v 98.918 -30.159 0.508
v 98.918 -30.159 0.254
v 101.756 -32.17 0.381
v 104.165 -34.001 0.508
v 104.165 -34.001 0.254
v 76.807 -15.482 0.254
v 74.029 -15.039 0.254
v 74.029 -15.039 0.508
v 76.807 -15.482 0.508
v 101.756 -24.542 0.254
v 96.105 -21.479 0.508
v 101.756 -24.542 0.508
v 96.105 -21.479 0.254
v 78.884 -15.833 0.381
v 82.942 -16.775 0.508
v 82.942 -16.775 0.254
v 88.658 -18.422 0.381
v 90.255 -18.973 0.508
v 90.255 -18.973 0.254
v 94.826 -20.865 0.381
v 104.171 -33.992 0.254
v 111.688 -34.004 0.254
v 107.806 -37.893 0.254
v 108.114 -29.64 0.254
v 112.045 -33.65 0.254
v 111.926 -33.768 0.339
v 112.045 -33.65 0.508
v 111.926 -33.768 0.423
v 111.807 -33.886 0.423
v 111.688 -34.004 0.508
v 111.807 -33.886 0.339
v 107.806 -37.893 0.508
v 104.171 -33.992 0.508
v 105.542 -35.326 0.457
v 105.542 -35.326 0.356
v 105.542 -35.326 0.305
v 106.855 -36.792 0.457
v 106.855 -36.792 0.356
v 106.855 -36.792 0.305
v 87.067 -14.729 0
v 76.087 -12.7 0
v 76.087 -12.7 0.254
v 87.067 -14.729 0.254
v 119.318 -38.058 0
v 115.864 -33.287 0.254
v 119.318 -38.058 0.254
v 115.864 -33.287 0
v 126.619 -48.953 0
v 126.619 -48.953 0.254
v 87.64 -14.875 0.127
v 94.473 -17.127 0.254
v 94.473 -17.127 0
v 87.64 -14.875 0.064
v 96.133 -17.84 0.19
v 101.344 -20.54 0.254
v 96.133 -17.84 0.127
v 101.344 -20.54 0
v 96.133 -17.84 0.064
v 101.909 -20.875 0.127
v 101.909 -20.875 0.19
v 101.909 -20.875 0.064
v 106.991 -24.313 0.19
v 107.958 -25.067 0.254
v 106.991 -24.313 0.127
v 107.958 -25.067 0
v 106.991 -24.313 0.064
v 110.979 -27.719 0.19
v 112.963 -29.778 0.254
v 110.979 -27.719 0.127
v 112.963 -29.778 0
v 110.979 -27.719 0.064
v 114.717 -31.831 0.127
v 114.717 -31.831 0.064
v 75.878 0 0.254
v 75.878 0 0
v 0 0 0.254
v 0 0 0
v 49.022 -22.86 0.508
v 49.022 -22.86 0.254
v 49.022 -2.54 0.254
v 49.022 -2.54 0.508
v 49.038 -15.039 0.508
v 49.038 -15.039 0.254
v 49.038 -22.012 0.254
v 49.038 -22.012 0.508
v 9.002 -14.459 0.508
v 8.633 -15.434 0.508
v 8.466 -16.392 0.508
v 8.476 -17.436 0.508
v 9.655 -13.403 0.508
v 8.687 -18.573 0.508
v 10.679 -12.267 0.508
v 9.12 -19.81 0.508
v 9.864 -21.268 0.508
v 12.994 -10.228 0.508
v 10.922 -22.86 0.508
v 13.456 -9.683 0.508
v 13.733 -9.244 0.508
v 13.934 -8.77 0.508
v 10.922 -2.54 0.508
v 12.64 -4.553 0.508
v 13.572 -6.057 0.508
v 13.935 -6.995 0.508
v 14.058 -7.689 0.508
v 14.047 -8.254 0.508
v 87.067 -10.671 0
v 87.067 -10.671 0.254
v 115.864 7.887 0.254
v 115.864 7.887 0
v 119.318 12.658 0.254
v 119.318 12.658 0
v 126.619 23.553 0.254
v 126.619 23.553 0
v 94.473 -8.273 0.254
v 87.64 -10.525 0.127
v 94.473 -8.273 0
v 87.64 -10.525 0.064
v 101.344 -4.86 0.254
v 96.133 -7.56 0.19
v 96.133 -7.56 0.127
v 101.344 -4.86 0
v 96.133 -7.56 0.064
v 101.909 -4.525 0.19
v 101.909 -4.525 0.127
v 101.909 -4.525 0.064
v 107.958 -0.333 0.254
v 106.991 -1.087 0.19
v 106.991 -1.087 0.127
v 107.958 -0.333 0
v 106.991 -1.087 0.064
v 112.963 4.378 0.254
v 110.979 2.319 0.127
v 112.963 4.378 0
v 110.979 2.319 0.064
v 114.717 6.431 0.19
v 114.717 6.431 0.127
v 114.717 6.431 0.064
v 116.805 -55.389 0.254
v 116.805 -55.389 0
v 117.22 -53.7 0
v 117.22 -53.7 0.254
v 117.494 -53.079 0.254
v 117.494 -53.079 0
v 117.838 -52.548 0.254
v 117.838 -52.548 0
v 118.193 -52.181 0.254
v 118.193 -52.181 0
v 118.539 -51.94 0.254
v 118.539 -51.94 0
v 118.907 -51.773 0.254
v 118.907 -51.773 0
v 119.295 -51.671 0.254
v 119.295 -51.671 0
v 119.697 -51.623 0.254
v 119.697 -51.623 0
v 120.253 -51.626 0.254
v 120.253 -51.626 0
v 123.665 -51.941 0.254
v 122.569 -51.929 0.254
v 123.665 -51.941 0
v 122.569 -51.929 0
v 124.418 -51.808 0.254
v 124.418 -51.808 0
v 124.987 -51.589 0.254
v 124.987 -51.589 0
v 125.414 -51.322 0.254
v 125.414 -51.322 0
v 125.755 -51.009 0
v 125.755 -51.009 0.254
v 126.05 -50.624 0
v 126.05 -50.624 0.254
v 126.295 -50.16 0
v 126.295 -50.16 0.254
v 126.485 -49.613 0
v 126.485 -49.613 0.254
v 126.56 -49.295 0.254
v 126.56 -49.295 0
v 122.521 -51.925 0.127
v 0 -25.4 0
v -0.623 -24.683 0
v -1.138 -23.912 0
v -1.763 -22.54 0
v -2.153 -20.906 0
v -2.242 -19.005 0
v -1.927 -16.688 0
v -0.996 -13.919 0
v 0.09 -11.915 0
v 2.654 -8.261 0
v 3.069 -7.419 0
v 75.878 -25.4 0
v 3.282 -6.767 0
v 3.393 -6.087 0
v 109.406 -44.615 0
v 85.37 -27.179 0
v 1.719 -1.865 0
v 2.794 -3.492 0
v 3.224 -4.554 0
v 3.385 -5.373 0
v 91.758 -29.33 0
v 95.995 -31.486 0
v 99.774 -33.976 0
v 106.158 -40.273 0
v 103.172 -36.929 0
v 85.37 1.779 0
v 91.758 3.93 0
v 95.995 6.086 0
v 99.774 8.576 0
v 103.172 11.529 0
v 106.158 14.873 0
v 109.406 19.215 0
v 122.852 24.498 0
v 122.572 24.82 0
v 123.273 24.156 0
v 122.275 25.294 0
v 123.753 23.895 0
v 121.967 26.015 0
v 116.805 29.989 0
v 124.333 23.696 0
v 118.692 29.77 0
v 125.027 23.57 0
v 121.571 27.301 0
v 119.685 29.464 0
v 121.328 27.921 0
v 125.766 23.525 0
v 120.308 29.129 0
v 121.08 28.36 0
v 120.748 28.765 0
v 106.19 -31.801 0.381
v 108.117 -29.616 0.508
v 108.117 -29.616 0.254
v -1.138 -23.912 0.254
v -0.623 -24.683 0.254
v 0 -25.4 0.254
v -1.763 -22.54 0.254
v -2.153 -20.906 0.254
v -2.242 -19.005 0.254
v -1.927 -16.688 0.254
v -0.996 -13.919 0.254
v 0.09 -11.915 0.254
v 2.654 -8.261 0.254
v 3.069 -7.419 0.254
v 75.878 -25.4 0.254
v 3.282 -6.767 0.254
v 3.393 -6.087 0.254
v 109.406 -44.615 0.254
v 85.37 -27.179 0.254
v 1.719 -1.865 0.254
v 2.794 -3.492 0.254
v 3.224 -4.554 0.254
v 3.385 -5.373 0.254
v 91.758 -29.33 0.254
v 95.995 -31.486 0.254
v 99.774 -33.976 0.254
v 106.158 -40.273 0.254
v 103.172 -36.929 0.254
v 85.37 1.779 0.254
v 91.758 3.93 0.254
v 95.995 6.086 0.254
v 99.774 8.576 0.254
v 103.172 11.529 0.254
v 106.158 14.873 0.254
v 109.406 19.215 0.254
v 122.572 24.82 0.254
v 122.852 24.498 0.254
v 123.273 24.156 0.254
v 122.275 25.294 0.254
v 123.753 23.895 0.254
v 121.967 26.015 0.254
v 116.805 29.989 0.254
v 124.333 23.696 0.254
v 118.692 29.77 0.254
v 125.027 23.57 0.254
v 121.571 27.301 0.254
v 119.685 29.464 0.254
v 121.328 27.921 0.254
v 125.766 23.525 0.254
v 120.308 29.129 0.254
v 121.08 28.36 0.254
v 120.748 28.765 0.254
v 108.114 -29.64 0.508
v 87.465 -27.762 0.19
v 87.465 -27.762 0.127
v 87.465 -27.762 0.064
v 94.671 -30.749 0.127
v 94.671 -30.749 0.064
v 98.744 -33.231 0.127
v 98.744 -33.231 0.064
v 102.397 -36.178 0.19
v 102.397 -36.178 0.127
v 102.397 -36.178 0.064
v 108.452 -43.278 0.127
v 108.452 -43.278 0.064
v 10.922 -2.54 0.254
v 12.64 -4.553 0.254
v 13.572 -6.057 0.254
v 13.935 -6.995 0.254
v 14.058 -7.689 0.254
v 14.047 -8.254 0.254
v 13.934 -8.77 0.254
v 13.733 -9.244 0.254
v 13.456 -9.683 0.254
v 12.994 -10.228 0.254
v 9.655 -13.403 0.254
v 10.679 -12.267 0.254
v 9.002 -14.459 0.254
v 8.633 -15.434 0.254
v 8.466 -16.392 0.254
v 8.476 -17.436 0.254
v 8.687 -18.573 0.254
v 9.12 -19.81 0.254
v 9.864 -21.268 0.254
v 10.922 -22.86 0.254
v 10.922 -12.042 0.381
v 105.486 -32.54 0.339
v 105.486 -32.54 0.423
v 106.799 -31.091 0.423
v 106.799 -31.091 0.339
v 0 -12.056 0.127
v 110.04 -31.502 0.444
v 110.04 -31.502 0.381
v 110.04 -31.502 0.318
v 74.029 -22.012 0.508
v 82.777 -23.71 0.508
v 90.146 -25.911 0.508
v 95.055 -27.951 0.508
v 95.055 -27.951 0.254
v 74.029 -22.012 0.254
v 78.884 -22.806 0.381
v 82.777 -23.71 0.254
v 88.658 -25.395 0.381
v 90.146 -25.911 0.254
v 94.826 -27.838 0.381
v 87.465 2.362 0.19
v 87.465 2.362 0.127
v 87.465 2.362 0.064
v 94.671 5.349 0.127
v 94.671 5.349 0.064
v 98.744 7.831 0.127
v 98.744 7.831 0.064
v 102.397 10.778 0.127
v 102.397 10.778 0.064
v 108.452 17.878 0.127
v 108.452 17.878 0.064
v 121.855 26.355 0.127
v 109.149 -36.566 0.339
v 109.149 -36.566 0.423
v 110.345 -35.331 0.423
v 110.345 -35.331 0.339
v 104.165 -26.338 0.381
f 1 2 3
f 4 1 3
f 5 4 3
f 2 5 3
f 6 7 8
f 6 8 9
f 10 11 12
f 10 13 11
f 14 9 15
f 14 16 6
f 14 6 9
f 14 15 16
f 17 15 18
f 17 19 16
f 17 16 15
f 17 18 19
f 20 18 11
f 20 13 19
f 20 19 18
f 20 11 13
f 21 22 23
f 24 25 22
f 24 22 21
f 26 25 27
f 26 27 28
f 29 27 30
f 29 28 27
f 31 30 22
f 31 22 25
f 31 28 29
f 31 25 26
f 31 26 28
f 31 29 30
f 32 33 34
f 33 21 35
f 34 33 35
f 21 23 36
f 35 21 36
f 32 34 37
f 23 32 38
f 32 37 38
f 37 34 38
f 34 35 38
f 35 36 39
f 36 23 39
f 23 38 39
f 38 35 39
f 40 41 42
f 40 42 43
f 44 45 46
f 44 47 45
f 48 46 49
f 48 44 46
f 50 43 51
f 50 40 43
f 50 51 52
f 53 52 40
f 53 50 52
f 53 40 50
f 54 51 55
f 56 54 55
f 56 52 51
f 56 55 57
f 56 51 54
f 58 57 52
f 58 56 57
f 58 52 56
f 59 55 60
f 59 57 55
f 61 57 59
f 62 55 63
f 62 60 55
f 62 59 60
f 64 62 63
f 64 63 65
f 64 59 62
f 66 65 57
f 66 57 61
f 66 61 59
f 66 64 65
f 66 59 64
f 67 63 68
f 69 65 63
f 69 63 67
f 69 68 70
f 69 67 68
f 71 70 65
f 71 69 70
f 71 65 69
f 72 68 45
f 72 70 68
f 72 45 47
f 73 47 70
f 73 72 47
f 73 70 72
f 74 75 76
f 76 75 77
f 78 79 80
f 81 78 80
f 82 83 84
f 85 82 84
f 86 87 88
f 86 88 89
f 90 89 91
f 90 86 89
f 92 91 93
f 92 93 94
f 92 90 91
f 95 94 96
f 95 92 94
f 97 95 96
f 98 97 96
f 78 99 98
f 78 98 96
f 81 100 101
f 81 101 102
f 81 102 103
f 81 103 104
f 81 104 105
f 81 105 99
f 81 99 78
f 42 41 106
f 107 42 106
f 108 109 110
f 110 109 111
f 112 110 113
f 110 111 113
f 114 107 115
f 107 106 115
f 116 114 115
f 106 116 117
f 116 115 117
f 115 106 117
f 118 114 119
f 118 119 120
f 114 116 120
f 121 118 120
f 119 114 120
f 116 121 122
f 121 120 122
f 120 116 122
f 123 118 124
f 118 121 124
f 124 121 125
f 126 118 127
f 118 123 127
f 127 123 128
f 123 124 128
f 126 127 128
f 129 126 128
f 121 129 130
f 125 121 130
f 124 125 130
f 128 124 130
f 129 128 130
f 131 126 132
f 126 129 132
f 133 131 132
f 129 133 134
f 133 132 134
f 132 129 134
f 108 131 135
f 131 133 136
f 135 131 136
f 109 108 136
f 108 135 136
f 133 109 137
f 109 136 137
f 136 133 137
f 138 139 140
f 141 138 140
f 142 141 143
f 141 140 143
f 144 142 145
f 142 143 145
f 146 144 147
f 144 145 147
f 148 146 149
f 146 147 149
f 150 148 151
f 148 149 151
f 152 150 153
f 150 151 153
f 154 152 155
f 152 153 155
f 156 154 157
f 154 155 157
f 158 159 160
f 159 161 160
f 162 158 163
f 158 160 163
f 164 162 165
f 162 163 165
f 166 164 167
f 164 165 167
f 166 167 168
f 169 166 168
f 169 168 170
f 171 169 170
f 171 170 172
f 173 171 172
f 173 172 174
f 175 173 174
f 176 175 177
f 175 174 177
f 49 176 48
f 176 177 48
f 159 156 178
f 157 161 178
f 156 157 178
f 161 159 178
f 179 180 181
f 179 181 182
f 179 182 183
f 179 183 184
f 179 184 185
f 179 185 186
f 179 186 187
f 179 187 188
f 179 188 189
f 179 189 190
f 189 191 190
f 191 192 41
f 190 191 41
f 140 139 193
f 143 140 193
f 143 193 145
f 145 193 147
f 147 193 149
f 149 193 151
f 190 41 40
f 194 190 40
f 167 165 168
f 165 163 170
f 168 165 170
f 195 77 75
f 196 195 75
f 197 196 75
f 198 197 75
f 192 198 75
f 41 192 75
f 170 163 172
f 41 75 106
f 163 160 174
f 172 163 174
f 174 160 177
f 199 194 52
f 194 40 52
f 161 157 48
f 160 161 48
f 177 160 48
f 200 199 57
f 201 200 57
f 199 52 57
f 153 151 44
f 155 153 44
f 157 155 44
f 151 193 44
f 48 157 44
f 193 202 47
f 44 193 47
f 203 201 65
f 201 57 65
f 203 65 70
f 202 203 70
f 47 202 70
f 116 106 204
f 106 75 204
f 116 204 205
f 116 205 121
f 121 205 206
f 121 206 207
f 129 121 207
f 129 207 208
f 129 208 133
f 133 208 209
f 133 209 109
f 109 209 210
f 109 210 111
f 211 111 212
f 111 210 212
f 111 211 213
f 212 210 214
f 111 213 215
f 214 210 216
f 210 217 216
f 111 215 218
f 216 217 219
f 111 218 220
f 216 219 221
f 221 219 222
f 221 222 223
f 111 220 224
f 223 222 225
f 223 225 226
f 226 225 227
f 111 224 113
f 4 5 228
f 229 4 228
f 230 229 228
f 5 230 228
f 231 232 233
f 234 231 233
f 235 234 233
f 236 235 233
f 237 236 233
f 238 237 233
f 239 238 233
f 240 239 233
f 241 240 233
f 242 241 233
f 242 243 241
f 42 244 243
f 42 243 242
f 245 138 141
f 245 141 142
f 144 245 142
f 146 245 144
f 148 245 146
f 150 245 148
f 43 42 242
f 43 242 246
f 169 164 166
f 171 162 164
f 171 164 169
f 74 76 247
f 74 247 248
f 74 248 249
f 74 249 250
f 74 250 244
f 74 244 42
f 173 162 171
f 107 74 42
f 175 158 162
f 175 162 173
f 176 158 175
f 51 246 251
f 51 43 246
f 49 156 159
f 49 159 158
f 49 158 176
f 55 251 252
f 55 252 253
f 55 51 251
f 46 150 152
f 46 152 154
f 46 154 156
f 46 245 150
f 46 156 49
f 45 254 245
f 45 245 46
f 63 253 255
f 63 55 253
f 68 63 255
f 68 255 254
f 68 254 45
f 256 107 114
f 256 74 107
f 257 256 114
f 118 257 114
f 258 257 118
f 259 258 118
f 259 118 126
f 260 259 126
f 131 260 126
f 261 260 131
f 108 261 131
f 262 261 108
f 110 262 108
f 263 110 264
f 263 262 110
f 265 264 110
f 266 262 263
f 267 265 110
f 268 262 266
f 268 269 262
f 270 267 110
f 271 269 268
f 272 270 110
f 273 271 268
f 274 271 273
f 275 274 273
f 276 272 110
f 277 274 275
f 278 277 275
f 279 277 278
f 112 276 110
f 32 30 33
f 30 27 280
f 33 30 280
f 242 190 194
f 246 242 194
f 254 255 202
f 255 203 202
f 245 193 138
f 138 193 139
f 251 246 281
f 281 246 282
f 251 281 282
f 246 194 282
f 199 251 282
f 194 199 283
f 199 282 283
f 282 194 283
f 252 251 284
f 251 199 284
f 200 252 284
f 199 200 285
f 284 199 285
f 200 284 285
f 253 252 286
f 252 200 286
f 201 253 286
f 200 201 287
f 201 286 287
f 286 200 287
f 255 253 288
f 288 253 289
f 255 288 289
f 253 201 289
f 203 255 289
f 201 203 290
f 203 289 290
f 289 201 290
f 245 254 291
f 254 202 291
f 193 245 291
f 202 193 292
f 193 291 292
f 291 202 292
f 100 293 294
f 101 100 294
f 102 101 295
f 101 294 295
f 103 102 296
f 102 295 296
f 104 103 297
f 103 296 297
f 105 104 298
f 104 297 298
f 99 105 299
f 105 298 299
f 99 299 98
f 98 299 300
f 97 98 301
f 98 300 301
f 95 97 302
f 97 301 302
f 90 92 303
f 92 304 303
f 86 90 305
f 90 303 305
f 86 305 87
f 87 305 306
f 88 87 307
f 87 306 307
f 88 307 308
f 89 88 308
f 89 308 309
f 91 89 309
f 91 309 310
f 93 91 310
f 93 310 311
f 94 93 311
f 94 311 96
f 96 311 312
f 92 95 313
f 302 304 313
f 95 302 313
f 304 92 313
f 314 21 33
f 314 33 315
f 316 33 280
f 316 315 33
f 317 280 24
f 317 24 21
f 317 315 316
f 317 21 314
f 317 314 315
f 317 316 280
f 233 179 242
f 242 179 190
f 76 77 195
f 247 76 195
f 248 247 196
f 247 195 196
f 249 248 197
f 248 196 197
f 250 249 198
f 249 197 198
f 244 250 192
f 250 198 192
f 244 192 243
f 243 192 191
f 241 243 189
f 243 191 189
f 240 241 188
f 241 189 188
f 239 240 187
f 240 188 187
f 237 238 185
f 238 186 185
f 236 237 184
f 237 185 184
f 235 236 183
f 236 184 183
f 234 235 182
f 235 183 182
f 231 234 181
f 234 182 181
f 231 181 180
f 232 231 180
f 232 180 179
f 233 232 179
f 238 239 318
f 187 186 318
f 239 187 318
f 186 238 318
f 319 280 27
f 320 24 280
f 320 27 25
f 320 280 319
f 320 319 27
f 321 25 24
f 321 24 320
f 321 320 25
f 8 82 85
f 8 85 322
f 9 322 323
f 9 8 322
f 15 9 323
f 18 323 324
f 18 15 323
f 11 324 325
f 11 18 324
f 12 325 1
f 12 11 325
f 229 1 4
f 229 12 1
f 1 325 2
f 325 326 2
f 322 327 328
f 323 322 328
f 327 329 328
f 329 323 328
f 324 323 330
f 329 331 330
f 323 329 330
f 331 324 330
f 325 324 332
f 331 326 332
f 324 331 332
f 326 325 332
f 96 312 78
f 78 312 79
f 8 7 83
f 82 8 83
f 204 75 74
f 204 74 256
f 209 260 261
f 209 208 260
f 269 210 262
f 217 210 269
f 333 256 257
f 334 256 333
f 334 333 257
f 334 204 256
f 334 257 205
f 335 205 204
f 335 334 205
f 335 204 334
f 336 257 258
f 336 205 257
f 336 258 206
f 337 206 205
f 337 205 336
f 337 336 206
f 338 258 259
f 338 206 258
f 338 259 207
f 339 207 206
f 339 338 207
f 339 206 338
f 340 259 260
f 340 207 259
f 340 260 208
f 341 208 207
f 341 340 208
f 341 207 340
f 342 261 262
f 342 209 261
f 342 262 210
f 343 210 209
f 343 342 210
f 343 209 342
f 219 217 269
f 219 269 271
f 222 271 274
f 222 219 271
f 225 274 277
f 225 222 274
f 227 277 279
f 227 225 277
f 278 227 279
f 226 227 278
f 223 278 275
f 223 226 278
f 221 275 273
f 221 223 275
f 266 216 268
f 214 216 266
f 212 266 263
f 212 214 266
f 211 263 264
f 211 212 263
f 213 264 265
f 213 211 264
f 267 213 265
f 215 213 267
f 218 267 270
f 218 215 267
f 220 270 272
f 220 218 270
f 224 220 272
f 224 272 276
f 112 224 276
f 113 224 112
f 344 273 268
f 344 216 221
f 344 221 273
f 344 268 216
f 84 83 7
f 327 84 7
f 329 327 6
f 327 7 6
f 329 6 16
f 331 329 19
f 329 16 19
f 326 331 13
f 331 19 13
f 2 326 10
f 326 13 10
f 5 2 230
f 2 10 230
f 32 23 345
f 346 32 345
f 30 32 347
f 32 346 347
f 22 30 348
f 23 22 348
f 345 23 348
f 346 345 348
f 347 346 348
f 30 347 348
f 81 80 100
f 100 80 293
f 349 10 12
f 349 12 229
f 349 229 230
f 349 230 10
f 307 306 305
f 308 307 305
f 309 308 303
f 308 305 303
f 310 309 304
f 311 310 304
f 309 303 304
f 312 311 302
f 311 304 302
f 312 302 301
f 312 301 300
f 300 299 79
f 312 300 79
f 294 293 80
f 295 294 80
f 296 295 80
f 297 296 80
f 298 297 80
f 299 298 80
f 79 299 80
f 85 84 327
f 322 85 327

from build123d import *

# Parameters (mm, degrees)
F1_DEPTH = 0.254
F3_DEPTH = 0.254
F5_DEPTH = 0.254
F7_DEPTH = 0.254


with BuildPart() as f1:
    # F0 (on Top) → F1 (new body)
    with BuildSketch(Plane.XY):
        with BuildLine():
            Line((75.8778452873, 0), (0, 0))
            add(Edge.make_bspline(
                [(0, 0), (6.2785497867, -6.0536758974), (-1.6684219392, -10.5268778435), (-3.4390024375, -21.9161491841), (0, -25.4)],
                knots=[0, 0, 0, 0, 0.4873086052, 1, 1, 1, 1], degree=3))
            Line((0, -25.4), (75.8778452873, -25.4))
            add(Edge.make_bspline(
                [(75.8778452873, -25.4), (85.8343930074, -26.7724701236), (93.8388538337, -29.7752200664), (102.6496075388, -35.7570827972), (109.2395856526, -44.0628139366), (112.4197915196, -49.1244153395), (116.80483073, -55.3887480214)],
                knots=[0, 0, 0, 0, 0.307318465, 0.5209586707, 0.7333340753, 1, 1, 1, 1], degree=3))
            add(Edge.make_bspline(
                [(116.80483073, -55.3887480214), (117.5869007423, -50.438671112), (122.5249790984, -52.7955302783), (126.2520253658, -51.535140723), (126.6189664602, -48.9530842751)],
                knots=[0, 0, 0, 0, 0.5346959438, 1, 1, 1, 1], degree=3))
            add(Edge.make_bspline(
                [(76.0866627097, -12.6999998465), (85.3244735821, -13.9733949817), (95.3942806427, -16.717494619), (107.3298202091, -24.0799513136), (115.4308502992, -31.8079037687), (122.1346774296, -42.2266523959), (126.6189664602, -48.9530842751)],
                knots=[0, 0, 0, 0, 0.2851339577, 0.5079865525, 0.7137762099, 1, 1, 1, 1], degree=3))
            add(Edge.make_bspline(
                [(76.0866627097, -12.6999998465), (85.3244735821, -11.4266047114), (95.3942806427, -8.6825050741), (107.3298202091, -1.3200483794), (115.4308502992, 6.4079040757), (122.1346774296, 16.8266527029), (126.6189664602, 23.5530845821)],
                knots=[0, 0, 0, 0, 0.2851339577, 0.5079865525, 0.7137762099, 1, 1, 1, 1], degree=3))
            add(Edge.make_bspline(
                [(116.80483073, 29.9887480214), (121.1760565639, 29.8197679222), (121.4907700555, 26.344497845), (123.1459379196, 23.2987627387), (126.6189664602, 23.5530845821)],
                knots=[0, 0, 0, 0, 0.5147972586, 1, 1, 1, 1], degree=3))
            add(Edge.make_bspline(
                [(75.8778452873, 0), (85.8343930074, 1.3724701236), (93.8388538337, 4.3752200664), (102.6496075388, 10.3570827972), (109.2395856526, 18.6628139366), (112.4197915196, 23.7244153395), (116.80483073, 29.9887480214)],
                knots=[0, 0, 0, 0, 0.307318465, 0.5209586707, 0.7333340753, 1, 1, 1, 1], degree=3))
        make_face()
    extrude(amount=F1_DEPTH)


with BuildPart() as f3:
    # F2 (on face) → F3 (new body)
    with BuildSketch(Plane.XY.offset(0.254)):
        with BuildLine():
            Line((49.0219895676, -2.5400017726), (10.9219895676, -2.5400017726))
            add(Edge.make_bspline(
                [(10.9219895676, -2.5400017726), (16.617264916, -8.5037945801), (9.7520207569, -11.3989025011), (6.9344084159, -17.441816538), (10.9219895676, -22.8600017726)],
                knots=[0, 0, 0, 0, 0.4837861097, 1, 1, 1, 1], degree=3))
            Line((10.9219895676, -22.8600017726), (49.0219895676, -22.8600017726))
            Line((49.0219895676, -22.8600017726), (49.0219895676, -2.5400017726))
        make_face()
    extrude(amount=F3_DEPTH)


with BuildPart() as f5:
    # F4 (on face) → F5 (new body)
    with BuildSketch(Plane.XY.offset(0.254)):
        with BuildLine():
            Line((49.0380935371, -15.0389395746), (49.0380935371, -22.0119617879))
            Line((49.0380935371, -22.0119617879), (74.029289186, -22.0119617879))
            add(Edge.make_bspline(
                [(74.029289186, -22.0119617879), (74.7474876213, -22.1219957865), (76.2662569253, -22.3546839283), (78.9661194201, -22.7678063221), (83.8487047925, -23.956293258), (88.6244277012, -25.2904840545), (94.8989330072, -27.6712350069), (97.6571553784, -29.3786304321), (98.9180132747, -30.1591269672)],
                knots=[0, 0, 0, 0, 0.1196970144, 0.2531224552, 0.4323341554, 0.6165627393, 0.8247204784, 1, 1, 1, 1], degree=3))
            add(Edge.make_bspline(
                [(98.9180132747, -30.1591269672), (99.8871751276, -30.8177490844), (101.7126445017, -32.1523381789), (103.4620310391, -33.3792983043), (104.1653677821, -34.0012423694)],
                knots=[0, 0, 0, 0, 0.5173630348, 1, 1, 1, 1], degree=3))
            add(Edge.make_bspline(
                [(104.1653677821, -34.0012423694), (104.8460840231, -33.2689778496), (106.1988742703, -31.8137454912), (107.4805273756, -30.3451876683), (108.1172600389, -29.6155996621)],
                knots=[0, 0, 0, 0, 0.5031942257, 1, 1, 1, 1], degree=3))
            add(Edge.make_bspline(
                [(101.7562970519, -24.542350322), (102.978831553, -25.4017321627), (104.1665471475, -26.360657397), (106.1895042658, -27.8806202114), (108.1172600389, -29.6155996621)],
                knots=[0, 0, 0, 0, 0.433443973, 1, 1, 1, 1], degree=3))
            add(Edge.make_bspline(
                [(74.029289186, -15.0389395746), (75.1255899668, -15.0979347527), (76.0699741171, -15.4071638466), (79.0500609961, -15.7879393483), (83.7812002208, -16.9690851075), (88.8094479954, -18.3861101897), (94.6739709102, -20.6044792006), (100.2071492671, -23.583396516), (101.7562970519, -24.542350322)],
                knots=[0, 0, 0, 0, 0.1138803905, 0.2408220805, 0.4113250666, 0.5866011433, 0.7846435483, 1, 1, 1, 1], degree=3))
            Line((74.029289186, -15.0389395746), (49.0380935371, -15.0389395746))
        make_face()
    extrude(amount=F5_DEPTH)


with BuildPart() as f7:
    # F6 (on face) → F7 (new body)
    with BuildSketch(Plane.XY.offset(0.254)):
        with BuildLine():
            add(Edge.make_bspline(
                [(104.1710475418, -33.9917691448), (105.4866958989, -32.5371997454), (106.7982937896, -31.0944876678), (108.1139421467, -29.6399182684)],
                knots=[0, 0, 0, 0, 5.8723950749, 5.8723950749, 5.8723950749, 5.8723950749], degree=3))
            add(Edge.make_bspline(
                [(104.1710475418, -33.9917691448), (104.4099439242, -34.1896572138), (104.8242851743, -34.6439646752), (105.5591015406, -35.3090622934), (106.2264910501, -36.1122166112), (106.8996351235, -36.842264614), (107.3925606354, -37.3664417525), (107.8056286666, -37.8932377124)],
                knots=[0, 0, 0, 0, 0.1864566355, 0.380122534, 0.5785809395, 0.7655571608, 1, 1, 1, 1], degree=3))
            add(Edge.make_bspline(
                [(107.8056286666, -37.8932377124), (109.319843612, -36.4589086186), (110.1742377292, -35.4378376941), (111.6884526747, -34.0035086003)],
                knots=[0, 0, 0, 0, 5.4960271873, 5.4960271873, 5.4960271873, 5.4960271873], degree=3))
            add(Edge.make_bspline(
                [(112.0454743505, -33.6504243314), (111.9264671252, -33.7681190877), (111.8074598999, -33.885813844), (111.6884526747, -34.0035086003)],
                knots=[0, 0, 0, 0, 0.5021284476, 0.5021284476, 0.5021284476, 0.5021284476], degree=3))
            add(Edge.make_bspline(
                [(108.1139421467, -29.6399182684), (108.453197494, -29.9530477635), (109.1234070026, -30.571644837), (110.0460648425, -31.5023143998), (111.0229990464, -32.5257970483), (111.7001125346, -33.2705586084), (112.0454743505, -33.6504243314)],
                knots=[0, 0, 0, 0, 0.2472781927, 0.4885057739, 0.7391123087, 1, 1, 1, 1], degree=3))
        make_face()
    extrude(amount=F7_DEPTH)


solid = Compound([f1.part, f3.part, f5.part, f7.part])
